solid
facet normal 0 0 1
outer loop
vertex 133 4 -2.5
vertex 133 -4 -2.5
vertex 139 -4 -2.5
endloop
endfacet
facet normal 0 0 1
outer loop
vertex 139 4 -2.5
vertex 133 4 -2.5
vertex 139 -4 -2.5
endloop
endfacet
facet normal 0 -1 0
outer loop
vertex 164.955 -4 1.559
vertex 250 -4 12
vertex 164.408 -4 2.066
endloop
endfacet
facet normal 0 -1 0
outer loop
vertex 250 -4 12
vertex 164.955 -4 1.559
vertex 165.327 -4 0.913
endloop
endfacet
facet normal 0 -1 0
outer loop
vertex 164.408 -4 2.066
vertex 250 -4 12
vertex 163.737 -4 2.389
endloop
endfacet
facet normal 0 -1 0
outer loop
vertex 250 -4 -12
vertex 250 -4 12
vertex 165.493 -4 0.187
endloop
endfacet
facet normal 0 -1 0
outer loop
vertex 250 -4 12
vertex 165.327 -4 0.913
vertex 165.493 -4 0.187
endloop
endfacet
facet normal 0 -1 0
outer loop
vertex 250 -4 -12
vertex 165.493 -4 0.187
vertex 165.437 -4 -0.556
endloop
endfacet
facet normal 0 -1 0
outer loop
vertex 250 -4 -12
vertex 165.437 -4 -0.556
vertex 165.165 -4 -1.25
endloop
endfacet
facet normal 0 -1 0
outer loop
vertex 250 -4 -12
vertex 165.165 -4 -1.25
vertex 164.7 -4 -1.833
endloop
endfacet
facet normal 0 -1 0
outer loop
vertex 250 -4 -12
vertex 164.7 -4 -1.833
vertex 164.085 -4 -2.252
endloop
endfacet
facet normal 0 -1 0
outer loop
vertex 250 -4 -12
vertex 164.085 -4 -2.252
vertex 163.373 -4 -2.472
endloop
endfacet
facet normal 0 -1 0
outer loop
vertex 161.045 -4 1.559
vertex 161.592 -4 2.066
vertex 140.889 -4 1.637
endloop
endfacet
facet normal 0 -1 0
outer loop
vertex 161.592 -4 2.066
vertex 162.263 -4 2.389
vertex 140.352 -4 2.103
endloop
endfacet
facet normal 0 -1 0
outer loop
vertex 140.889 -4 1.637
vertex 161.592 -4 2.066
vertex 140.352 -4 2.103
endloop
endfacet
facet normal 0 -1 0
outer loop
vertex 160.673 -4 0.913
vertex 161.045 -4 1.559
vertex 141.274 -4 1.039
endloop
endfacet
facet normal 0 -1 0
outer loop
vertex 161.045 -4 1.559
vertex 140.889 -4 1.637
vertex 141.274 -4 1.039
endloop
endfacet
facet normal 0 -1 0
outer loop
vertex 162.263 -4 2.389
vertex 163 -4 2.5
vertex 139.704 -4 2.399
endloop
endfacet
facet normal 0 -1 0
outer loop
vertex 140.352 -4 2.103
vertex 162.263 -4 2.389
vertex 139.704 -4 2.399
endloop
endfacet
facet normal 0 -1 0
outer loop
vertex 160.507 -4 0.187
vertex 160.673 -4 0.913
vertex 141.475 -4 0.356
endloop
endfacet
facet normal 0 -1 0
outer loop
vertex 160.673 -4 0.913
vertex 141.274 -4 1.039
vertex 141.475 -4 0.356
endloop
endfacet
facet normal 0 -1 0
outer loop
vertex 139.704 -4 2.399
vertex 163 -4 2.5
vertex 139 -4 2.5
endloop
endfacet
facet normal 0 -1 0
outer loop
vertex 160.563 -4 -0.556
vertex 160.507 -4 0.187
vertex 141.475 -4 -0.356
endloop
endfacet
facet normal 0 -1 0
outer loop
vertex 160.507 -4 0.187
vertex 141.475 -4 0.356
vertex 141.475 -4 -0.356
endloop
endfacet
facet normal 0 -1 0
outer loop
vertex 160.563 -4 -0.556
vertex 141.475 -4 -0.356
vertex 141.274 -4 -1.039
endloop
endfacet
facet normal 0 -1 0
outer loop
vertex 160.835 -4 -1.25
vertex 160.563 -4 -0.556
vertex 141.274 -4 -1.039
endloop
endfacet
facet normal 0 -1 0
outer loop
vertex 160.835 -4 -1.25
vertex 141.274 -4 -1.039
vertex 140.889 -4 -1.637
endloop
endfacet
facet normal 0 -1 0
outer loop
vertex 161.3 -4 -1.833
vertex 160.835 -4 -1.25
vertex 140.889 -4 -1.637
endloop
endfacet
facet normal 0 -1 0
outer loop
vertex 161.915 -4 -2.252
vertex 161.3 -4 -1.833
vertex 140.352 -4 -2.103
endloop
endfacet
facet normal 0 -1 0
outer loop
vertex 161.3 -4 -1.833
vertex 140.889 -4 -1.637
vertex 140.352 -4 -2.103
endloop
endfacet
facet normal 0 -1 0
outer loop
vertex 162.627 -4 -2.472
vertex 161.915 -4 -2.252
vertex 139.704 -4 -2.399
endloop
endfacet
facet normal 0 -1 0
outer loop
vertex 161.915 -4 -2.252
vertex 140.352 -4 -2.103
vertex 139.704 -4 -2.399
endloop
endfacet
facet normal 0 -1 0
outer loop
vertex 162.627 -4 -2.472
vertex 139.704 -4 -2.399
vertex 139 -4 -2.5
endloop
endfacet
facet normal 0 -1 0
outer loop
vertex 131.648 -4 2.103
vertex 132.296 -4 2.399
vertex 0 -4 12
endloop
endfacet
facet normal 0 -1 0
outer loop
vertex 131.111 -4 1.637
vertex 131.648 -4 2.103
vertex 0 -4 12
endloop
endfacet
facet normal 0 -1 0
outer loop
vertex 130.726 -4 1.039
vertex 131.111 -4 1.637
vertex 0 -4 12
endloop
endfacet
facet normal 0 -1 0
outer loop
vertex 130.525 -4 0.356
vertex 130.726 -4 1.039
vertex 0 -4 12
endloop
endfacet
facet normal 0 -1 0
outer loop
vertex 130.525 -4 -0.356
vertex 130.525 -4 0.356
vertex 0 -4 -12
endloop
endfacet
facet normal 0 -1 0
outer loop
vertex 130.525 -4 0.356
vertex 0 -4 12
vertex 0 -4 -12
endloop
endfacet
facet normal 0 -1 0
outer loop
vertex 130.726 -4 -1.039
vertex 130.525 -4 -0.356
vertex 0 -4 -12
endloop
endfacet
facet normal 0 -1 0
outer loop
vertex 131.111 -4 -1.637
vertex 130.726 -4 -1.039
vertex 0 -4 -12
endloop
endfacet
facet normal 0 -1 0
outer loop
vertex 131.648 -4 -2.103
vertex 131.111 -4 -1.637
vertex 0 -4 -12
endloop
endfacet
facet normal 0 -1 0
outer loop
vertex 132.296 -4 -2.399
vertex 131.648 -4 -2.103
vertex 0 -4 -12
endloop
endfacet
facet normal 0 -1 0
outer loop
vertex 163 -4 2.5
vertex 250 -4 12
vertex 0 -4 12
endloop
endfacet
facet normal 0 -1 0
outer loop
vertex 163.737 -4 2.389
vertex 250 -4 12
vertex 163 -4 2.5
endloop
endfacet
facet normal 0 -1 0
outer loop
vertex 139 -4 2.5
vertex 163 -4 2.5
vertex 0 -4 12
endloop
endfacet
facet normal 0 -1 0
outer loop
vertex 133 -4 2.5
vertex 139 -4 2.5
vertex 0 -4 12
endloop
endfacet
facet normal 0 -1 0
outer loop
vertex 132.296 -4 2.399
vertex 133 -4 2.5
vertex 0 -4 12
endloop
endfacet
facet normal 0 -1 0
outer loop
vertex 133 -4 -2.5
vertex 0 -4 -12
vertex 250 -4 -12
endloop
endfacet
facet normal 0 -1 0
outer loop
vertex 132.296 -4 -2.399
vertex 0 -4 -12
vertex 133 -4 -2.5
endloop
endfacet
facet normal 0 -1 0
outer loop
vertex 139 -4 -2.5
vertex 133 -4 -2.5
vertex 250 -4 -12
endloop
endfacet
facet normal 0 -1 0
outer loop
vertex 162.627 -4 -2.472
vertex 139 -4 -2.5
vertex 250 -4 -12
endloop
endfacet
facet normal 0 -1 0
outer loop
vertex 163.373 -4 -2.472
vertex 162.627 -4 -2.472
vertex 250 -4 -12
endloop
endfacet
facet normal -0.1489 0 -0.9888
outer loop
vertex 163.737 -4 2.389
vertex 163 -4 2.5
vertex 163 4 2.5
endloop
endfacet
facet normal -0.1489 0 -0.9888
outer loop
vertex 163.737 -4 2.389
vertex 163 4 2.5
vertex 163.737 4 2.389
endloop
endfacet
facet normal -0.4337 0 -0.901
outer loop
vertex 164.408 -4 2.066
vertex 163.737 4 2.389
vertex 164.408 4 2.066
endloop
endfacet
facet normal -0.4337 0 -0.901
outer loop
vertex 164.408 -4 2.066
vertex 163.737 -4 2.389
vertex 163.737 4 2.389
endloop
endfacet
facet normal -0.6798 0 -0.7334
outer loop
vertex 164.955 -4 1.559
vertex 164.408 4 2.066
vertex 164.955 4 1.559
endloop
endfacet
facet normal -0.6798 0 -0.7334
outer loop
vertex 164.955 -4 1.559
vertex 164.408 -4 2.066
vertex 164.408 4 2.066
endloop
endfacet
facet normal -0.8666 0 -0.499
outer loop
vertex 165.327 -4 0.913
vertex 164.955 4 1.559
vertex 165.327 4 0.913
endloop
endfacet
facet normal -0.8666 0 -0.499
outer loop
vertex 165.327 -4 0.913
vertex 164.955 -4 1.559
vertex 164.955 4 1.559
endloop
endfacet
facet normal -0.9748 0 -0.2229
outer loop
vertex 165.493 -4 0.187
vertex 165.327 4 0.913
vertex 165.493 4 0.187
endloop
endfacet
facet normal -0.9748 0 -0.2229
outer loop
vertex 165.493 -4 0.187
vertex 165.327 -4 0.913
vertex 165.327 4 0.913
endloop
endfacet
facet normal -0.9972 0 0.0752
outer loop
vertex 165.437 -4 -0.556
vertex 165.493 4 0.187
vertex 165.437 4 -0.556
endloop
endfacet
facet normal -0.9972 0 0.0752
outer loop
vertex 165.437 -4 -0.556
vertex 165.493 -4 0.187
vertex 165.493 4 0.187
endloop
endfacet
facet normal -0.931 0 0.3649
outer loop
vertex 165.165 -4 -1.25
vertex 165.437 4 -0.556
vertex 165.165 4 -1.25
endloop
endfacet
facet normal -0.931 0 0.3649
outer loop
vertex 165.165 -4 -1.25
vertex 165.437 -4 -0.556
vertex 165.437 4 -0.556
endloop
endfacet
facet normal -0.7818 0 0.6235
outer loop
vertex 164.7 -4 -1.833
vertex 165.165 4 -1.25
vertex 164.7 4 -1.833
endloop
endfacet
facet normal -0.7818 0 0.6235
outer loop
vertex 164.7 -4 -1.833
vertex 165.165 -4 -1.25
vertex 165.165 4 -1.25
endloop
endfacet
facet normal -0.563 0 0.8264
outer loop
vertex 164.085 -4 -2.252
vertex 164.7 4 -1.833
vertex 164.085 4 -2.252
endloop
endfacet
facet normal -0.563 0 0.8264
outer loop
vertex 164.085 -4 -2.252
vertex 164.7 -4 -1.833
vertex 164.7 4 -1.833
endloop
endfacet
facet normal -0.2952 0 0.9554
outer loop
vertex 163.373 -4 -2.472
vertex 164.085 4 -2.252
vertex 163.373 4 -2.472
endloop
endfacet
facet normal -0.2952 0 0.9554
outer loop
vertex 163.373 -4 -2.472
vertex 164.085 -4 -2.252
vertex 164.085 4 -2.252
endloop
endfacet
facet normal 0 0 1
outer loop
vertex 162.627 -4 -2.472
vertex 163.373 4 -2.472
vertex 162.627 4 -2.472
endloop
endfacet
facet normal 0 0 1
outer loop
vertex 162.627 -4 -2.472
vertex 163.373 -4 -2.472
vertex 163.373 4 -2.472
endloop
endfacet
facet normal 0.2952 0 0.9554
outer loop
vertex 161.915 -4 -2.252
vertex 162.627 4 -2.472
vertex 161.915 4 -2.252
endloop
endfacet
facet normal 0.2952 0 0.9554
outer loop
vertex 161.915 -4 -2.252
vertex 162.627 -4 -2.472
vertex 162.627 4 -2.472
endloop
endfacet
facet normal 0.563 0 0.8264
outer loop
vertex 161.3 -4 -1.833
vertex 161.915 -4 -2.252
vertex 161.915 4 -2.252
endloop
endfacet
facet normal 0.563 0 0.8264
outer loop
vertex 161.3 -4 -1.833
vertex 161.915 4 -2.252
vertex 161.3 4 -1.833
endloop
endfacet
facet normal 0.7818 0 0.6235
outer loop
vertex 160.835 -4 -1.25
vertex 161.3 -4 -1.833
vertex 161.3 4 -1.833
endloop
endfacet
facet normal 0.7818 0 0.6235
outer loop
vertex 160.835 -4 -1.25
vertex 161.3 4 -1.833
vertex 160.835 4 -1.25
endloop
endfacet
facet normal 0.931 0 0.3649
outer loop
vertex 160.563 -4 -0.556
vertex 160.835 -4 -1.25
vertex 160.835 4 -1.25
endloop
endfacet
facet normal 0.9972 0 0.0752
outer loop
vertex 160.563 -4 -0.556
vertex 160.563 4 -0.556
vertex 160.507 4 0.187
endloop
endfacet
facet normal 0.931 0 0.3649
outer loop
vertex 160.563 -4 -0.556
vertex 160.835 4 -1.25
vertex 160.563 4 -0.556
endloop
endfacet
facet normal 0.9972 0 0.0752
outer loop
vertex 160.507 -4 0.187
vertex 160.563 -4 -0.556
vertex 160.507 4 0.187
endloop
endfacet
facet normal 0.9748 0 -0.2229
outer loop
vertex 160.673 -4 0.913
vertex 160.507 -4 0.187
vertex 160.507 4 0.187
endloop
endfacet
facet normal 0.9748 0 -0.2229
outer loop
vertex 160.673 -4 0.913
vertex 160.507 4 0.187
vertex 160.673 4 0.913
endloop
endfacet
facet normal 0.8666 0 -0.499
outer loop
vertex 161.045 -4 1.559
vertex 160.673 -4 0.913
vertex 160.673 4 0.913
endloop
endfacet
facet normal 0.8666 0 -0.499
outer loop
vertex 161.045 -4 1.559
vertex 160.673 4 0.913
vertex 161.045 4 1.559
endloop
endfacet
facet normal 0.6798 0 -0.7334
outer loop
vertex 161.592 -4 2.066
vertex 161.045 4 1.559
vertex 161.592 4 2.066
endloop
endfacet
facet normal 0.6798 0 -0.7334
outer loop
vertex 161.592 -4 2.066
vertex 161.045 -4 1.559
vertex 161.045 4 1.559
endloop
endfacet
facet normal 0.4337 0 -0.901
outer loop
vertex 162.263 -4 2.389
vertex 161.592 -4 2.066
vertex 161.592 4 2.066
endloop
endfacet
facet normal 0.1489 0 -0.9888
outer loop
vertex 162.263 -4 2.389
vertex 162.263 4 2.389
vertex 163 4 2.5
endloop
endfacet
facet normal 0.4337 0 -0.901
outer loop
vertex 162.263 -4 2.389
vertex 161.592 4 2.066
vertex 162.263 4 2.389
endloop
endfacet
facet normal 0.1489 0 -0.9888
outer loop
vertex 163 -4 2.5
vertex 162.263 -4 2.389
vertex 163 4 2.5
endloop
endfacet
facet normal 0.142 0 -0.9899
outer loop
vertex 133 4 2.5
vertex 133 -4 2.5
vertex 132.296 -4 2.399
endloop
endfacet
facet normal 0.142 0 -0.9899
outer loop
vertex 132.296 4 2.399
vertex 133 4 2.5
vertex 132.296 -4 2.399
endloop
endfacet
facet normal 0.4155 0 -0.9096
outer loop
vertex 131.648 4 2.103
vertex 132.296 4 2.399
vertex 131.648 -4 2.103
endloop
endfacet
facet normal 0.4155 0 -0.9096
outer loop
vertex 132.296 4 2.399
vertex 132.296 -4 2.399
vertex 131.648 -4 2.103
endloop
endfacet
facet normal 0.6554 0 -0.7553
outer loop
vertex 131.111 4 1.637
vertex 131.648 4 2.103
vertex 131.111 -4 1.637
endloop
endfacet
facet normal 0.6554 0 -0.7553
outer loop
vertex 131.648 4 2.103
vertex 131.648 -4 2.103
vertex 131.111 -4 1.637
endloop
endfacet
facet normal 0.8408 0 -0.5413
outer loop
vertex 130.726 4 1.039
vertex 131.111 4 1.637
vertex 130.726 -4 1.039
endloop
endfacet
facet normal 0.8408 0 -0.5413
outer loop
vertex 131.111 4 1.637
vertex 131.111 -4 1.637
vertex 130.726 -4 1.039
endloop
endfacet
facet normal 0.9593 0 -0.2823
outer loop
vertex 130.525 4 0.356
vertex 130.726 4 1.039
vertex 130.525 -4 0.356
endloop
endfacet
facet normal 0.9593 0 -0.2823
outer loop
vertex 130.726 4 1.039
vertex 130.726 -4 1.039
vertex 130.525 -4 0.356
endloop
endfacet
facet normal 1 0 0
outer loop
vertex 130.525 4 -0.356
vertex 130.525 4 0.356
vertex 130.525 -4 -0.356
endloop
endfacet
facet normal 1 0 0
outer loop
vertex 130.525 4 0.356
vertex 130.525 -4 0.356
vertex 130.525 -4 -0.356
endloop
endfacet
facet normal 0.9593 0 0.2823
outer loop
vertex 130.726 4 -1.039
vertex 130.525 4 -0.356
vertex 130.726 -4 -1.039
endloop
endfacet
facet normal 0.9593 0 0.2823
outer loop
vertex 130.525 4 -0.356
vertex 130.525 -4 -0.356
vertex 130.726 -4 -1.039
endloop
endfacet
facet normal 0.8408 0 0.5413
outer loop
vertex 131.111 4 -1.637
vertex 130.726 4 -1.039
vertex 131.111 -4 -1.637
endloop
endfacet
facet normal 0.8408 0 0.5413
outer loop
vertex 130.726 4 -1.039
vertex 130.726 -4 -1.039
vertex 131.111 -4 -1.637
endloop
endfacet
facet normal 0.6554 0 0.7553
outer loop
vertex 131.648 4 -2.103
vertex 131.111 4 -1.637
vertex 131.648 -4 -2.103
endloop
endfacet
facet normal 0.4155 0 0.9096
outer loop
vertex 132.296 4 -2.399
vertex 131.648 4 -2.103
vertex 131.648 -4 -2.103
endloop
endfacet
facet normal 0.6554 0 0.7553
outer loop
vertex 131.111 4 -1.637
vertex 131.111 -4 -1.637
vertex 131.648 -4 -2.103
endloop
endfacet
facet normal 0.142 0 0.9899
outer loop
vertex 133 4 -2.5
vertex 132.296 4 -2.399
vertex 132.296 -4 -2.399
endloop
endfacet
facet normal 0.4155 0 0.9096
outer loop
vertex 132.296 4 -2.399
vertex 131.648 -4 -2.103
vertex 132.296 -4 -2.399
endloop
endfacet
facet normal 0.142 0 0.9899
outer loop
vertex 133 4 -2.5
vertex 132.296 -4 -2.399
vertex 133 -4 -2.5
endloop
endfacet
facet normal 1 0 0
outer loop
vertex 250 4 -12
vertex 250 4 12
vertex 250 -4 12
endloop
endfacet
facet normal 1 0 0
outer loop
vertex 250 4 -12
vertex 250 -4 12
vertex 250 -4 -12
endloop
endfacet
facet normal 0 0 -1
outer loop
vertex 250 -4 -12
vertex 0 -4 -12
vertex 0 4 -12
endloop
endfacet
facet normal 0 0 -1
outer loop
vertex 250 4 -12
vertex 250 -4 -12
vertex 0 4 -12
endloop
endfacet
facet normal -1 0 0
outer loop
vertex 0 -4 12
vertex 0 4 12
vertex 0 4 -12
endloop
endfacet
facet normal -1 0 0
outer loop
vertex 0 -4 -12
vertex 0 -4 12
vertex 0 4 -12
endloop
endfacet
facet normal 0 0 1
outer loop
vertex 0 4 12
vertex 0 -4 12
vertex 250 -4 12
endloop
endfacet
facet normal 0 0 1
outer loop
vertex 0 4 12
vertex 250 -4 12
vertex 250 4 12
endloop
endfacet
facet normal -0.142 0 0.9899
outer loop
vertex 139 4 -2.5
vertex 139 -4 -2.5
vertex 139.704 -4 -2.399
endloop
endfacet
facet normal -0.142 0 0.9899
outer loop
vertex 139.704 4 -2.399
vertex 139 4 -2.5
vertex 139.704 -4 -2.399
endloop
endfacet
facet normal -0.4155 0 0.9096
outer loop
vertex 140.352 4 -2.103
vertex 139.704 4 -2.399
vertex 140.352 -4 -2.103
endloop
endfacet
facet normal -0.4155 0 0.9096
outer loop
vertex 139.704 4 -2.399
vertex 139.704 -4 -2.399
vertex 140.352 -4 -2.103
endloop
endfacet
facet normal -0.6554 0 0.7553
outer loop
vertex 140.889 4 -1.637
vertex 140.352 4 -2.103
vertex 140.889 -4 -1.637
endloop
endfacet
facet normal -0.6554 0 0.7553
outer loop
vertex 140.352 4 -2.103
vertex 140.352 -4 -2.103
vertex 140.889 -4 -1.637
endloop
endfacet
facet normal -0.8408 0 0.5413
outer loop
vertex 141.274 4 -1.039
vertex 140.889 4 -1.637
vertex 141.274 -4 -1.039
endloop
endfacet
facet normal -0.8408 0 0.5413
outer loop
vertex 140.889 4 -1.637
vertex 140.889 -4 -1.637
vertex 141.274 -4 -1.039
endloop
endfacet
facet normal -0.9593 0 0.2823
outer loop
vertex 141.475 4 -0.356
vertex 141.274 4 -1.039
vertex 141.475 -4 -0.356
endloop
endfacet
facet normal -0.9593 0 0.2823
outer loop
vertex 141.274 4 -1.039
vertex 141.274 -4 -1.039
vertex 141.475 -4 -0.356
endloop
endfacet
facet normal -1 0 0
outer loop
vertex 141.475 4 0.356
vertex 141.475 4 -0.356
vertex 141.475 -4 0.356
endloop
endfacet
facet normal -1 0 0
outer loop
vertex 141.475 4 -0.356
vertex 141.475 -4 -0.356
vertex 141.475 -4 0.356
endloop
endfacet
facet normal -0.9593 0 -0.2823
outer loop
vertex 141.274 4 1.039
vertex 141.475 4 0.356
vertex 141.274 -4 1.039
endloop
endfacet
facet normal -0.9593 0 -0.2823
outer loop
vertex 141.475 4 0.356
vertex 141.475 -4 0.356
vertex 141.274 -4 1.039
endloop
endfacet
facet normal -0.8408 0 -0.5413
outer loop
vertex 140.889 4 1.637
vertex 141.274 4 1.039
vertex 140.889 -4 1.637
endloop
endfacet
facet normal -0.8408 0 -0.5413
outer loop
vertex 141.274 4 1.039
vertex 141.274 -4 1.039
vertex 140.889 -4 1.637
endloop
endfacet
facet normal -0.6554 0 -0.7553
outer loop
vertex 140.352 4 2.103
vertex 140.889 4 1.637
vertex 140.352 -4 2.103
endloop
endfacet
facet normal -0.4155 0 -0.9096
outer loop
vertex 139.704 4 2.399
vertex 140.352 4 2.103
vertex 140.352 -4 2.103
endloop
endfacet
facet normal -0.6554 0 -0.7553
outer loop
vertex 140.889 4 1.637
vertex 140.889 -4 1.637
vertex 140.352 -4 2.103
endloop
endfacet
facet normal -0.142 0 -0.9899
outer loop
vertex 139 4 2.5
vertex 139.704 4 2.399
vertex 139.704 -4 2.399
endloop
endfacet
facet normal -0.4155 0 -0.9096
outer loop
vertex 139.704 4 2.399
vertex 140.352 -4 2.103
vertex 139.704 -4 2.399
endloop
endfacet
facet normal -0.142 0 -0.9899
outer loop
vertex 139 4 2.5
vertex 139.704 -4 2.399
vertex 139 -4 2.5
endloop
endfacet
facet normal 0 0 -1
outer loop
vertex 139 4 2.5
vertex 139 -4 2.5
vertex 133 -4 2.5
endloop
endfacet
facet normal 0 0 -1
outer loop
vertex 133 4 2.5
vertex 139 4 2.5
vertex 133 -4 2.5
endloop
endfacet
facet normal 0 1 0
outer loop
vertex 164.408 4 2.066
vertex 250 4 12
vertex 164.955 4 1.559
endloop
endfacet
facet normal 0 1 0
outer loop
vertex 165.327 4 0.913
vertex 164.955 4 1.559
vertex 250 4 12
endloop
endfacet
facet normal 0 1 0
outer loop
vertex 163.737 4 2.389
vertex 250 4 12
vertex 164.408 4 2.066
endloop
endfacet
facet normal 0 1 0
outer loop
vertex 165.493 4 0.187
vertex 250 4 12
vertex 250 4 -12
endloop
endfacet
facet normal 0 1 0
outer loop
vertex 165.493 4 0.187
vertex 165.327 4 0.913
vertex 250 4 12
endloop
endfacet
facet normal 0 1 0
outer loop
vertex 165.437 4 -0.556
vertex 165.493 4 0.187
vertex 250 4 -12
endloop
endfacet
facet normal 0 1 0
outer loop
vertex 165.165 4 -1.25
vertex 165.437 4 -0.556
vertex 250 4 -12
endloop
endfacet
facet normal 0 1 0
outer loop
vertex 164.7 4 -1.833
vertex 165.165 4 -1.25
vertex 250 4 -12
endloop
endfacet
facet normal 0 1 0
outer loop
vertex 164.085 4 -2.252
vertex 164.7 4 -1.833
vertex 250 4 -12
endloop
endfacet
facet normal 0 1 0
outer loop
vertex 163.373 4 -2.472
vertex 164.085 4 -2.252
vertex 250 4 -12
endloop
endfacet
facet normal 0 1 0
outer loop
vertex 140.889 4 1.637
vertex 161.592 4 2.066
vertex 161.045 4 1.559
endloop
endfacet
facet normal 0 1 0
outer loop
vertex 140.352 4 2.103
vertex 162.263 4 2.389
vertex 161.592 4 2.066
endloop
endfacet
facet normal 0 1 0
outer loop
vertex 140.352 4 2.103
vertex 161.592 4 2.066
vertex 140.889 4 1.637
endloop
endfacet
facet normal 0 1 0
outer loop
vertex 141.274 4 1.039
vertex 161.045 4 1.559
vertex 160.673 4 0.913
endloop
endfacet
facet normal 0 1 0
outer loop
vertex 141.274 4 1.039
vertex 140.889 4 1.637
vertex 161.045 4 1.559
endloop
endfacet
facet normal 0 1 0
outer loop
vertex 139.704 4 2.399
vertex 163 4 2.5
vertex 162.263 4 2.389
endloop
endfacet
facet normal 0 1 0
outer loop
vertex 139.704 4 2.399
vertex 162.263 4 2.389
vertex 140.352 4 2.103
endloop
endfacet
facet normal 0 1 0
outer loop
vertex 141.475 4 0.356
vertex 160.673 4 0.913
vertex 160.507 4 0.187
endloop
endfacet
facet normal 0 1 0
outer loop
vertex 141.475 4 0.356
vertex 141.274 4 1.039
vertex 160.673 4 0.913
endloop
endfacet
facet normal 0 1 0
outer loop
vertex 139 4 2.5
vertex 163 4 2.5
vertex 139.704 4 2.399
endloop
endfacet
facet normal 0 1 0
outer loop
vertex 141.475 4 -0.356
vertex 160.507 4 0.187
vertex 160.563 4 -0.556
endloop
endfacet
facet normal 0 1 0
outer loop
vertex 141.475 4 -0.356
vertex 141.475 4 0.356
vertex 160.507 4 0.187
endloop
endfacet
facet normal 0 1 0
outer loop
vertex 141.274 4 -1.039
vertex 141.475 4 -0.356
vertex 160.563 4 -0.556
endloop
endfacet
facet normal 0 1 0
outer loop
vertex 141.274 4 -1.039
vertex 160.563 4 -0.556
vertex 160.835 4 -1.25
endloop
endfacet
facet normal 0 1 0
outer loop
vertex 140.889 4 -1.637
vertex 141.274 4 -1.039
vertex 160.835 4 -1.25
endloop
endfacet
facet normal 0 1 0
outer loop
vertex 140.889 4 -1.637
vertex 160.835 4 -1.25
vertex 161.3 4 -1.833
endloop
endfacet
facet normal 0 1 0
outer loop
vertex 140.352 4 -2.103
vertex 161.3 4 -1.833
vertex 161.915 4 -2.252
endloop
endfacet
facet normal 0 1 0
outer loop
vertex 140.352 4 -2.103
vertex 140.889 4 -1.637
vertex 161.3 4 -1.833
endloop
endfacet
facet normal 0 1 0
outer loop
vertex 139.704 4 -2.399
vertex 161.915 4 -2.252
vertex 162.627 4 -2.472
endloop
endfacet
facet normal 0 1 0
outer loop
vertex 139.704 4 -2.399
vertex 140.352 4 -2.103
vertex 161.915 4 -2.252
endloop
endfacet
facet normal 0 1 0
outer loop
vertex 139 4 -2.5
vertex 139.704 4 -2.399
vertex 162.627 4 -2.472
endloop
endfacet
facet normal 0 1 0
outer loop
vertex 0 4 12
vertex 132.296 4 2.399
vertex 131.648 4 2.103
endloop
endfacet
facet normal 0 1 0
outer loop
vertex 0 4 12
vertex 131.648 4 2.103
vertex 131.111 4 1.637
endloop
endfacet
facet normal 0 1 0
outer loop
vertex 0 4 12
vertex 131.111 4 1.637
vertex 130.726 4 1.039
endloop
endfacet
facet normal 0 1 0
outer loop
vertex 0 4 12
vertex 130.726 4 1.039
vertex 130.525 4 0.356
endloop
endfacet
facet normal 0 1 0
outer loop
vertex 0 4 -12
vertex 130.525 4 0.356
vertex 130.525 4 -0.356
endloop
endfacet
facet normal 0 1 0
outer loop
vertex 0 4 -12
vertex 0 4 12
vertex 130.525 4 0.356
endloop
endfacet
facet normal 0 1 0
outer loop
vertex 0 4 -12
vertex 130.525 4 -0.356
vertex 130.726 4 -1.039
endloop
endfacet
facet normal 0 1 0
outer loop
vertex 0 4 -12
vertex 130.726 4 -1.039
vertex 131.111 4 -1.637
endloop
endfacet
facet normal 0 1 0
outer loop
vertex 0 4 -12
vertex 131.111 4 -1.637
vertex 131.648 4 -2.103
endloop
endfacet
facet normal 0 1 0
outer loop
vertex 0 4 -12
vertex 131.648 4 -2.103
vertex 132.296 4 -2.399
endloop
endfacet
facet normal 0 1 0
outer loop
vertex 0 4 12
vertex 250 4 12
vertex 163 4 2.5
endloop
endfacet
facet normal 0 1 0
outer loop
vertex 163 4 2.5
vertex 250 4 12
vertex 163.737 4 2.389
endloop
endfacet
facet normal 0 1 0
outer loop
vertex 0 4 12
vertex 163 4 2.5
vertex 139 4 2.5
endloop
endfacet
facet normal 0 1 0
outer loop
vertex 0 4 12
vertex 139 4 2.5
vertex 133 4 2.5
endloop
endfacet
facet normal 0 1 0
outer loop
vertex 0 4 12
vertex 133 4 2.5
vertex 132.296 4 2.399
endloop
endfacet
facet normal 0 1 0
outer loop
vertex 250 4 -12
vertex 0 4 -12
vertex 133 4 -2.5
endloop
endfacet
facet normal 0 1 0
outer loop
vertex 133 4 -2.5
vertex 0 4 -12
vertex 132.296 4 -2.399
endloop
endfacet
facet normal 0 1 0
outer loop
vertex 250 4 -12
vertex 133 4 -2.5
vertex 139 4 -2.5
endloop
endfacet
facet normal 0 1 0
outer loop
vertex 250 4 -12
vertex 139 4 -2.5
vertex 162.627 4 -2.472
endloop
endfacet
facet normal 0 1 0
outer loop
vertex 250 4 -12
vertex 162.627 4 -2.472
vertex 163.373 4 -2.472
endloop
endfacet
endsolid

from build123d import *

# Parameters (mm, degrees)
SKETCH_1_W               = 24
SKETCH_1_H               = 8
EXTRUDE_1_DEPTH          = 250
CUT_EXTRUDE_3_DEPTH      = 251.319795462
CUT_EXTRUDE_3_DEPTH_BACK = 251.319795462
SKETCH_2_R               = 2.5


with BuildPart() as part:
    # 草图1 → 凸台-拉伸1 (new body)
    with BuildSketch(Plane(origin=(0, 0, 0), x_dir=(0, 0, -1), z_dir=(1, 0, 0))):
        Rectangle(SKETCH_1_W, SKETCH_1_H)
    extrude(amount=EXTRUDE_1_DEPTH)

    # 草图2 → 切除-拉伸3 (cut, two sides: drawn at the far end of the back side and taken through both)
    with BuildSketch(Plane(origin=(0, 0, 0), x_dir=(1, 0, 0), z_dir=(0, 1, 0)).offset(-CUT_EXTRUDE_3_DEPTH_BACK)):
        with Locations(Location((163, 0, 0), (0, 0, 270))):
            Circle(SKETCH_2_R)
        with BuildLine():
            Line((133, 2.5), (139, 2.5))
            ThreePointArc((139, 2.5), (141.5, 0), (139, -2.5))
            Line((139, -2.5), (133, -2.5))
            ThreePointArc((133, -2.5), (130.5, 0), (133, 2.5))
        make_face()
    extrude(amount=CUT_EXTRUDE_3_DEPTH + CUT_EXTRUDE_3_DEPTH_BACK, mode=Mode.SUBTRACT)


solid = part.part
